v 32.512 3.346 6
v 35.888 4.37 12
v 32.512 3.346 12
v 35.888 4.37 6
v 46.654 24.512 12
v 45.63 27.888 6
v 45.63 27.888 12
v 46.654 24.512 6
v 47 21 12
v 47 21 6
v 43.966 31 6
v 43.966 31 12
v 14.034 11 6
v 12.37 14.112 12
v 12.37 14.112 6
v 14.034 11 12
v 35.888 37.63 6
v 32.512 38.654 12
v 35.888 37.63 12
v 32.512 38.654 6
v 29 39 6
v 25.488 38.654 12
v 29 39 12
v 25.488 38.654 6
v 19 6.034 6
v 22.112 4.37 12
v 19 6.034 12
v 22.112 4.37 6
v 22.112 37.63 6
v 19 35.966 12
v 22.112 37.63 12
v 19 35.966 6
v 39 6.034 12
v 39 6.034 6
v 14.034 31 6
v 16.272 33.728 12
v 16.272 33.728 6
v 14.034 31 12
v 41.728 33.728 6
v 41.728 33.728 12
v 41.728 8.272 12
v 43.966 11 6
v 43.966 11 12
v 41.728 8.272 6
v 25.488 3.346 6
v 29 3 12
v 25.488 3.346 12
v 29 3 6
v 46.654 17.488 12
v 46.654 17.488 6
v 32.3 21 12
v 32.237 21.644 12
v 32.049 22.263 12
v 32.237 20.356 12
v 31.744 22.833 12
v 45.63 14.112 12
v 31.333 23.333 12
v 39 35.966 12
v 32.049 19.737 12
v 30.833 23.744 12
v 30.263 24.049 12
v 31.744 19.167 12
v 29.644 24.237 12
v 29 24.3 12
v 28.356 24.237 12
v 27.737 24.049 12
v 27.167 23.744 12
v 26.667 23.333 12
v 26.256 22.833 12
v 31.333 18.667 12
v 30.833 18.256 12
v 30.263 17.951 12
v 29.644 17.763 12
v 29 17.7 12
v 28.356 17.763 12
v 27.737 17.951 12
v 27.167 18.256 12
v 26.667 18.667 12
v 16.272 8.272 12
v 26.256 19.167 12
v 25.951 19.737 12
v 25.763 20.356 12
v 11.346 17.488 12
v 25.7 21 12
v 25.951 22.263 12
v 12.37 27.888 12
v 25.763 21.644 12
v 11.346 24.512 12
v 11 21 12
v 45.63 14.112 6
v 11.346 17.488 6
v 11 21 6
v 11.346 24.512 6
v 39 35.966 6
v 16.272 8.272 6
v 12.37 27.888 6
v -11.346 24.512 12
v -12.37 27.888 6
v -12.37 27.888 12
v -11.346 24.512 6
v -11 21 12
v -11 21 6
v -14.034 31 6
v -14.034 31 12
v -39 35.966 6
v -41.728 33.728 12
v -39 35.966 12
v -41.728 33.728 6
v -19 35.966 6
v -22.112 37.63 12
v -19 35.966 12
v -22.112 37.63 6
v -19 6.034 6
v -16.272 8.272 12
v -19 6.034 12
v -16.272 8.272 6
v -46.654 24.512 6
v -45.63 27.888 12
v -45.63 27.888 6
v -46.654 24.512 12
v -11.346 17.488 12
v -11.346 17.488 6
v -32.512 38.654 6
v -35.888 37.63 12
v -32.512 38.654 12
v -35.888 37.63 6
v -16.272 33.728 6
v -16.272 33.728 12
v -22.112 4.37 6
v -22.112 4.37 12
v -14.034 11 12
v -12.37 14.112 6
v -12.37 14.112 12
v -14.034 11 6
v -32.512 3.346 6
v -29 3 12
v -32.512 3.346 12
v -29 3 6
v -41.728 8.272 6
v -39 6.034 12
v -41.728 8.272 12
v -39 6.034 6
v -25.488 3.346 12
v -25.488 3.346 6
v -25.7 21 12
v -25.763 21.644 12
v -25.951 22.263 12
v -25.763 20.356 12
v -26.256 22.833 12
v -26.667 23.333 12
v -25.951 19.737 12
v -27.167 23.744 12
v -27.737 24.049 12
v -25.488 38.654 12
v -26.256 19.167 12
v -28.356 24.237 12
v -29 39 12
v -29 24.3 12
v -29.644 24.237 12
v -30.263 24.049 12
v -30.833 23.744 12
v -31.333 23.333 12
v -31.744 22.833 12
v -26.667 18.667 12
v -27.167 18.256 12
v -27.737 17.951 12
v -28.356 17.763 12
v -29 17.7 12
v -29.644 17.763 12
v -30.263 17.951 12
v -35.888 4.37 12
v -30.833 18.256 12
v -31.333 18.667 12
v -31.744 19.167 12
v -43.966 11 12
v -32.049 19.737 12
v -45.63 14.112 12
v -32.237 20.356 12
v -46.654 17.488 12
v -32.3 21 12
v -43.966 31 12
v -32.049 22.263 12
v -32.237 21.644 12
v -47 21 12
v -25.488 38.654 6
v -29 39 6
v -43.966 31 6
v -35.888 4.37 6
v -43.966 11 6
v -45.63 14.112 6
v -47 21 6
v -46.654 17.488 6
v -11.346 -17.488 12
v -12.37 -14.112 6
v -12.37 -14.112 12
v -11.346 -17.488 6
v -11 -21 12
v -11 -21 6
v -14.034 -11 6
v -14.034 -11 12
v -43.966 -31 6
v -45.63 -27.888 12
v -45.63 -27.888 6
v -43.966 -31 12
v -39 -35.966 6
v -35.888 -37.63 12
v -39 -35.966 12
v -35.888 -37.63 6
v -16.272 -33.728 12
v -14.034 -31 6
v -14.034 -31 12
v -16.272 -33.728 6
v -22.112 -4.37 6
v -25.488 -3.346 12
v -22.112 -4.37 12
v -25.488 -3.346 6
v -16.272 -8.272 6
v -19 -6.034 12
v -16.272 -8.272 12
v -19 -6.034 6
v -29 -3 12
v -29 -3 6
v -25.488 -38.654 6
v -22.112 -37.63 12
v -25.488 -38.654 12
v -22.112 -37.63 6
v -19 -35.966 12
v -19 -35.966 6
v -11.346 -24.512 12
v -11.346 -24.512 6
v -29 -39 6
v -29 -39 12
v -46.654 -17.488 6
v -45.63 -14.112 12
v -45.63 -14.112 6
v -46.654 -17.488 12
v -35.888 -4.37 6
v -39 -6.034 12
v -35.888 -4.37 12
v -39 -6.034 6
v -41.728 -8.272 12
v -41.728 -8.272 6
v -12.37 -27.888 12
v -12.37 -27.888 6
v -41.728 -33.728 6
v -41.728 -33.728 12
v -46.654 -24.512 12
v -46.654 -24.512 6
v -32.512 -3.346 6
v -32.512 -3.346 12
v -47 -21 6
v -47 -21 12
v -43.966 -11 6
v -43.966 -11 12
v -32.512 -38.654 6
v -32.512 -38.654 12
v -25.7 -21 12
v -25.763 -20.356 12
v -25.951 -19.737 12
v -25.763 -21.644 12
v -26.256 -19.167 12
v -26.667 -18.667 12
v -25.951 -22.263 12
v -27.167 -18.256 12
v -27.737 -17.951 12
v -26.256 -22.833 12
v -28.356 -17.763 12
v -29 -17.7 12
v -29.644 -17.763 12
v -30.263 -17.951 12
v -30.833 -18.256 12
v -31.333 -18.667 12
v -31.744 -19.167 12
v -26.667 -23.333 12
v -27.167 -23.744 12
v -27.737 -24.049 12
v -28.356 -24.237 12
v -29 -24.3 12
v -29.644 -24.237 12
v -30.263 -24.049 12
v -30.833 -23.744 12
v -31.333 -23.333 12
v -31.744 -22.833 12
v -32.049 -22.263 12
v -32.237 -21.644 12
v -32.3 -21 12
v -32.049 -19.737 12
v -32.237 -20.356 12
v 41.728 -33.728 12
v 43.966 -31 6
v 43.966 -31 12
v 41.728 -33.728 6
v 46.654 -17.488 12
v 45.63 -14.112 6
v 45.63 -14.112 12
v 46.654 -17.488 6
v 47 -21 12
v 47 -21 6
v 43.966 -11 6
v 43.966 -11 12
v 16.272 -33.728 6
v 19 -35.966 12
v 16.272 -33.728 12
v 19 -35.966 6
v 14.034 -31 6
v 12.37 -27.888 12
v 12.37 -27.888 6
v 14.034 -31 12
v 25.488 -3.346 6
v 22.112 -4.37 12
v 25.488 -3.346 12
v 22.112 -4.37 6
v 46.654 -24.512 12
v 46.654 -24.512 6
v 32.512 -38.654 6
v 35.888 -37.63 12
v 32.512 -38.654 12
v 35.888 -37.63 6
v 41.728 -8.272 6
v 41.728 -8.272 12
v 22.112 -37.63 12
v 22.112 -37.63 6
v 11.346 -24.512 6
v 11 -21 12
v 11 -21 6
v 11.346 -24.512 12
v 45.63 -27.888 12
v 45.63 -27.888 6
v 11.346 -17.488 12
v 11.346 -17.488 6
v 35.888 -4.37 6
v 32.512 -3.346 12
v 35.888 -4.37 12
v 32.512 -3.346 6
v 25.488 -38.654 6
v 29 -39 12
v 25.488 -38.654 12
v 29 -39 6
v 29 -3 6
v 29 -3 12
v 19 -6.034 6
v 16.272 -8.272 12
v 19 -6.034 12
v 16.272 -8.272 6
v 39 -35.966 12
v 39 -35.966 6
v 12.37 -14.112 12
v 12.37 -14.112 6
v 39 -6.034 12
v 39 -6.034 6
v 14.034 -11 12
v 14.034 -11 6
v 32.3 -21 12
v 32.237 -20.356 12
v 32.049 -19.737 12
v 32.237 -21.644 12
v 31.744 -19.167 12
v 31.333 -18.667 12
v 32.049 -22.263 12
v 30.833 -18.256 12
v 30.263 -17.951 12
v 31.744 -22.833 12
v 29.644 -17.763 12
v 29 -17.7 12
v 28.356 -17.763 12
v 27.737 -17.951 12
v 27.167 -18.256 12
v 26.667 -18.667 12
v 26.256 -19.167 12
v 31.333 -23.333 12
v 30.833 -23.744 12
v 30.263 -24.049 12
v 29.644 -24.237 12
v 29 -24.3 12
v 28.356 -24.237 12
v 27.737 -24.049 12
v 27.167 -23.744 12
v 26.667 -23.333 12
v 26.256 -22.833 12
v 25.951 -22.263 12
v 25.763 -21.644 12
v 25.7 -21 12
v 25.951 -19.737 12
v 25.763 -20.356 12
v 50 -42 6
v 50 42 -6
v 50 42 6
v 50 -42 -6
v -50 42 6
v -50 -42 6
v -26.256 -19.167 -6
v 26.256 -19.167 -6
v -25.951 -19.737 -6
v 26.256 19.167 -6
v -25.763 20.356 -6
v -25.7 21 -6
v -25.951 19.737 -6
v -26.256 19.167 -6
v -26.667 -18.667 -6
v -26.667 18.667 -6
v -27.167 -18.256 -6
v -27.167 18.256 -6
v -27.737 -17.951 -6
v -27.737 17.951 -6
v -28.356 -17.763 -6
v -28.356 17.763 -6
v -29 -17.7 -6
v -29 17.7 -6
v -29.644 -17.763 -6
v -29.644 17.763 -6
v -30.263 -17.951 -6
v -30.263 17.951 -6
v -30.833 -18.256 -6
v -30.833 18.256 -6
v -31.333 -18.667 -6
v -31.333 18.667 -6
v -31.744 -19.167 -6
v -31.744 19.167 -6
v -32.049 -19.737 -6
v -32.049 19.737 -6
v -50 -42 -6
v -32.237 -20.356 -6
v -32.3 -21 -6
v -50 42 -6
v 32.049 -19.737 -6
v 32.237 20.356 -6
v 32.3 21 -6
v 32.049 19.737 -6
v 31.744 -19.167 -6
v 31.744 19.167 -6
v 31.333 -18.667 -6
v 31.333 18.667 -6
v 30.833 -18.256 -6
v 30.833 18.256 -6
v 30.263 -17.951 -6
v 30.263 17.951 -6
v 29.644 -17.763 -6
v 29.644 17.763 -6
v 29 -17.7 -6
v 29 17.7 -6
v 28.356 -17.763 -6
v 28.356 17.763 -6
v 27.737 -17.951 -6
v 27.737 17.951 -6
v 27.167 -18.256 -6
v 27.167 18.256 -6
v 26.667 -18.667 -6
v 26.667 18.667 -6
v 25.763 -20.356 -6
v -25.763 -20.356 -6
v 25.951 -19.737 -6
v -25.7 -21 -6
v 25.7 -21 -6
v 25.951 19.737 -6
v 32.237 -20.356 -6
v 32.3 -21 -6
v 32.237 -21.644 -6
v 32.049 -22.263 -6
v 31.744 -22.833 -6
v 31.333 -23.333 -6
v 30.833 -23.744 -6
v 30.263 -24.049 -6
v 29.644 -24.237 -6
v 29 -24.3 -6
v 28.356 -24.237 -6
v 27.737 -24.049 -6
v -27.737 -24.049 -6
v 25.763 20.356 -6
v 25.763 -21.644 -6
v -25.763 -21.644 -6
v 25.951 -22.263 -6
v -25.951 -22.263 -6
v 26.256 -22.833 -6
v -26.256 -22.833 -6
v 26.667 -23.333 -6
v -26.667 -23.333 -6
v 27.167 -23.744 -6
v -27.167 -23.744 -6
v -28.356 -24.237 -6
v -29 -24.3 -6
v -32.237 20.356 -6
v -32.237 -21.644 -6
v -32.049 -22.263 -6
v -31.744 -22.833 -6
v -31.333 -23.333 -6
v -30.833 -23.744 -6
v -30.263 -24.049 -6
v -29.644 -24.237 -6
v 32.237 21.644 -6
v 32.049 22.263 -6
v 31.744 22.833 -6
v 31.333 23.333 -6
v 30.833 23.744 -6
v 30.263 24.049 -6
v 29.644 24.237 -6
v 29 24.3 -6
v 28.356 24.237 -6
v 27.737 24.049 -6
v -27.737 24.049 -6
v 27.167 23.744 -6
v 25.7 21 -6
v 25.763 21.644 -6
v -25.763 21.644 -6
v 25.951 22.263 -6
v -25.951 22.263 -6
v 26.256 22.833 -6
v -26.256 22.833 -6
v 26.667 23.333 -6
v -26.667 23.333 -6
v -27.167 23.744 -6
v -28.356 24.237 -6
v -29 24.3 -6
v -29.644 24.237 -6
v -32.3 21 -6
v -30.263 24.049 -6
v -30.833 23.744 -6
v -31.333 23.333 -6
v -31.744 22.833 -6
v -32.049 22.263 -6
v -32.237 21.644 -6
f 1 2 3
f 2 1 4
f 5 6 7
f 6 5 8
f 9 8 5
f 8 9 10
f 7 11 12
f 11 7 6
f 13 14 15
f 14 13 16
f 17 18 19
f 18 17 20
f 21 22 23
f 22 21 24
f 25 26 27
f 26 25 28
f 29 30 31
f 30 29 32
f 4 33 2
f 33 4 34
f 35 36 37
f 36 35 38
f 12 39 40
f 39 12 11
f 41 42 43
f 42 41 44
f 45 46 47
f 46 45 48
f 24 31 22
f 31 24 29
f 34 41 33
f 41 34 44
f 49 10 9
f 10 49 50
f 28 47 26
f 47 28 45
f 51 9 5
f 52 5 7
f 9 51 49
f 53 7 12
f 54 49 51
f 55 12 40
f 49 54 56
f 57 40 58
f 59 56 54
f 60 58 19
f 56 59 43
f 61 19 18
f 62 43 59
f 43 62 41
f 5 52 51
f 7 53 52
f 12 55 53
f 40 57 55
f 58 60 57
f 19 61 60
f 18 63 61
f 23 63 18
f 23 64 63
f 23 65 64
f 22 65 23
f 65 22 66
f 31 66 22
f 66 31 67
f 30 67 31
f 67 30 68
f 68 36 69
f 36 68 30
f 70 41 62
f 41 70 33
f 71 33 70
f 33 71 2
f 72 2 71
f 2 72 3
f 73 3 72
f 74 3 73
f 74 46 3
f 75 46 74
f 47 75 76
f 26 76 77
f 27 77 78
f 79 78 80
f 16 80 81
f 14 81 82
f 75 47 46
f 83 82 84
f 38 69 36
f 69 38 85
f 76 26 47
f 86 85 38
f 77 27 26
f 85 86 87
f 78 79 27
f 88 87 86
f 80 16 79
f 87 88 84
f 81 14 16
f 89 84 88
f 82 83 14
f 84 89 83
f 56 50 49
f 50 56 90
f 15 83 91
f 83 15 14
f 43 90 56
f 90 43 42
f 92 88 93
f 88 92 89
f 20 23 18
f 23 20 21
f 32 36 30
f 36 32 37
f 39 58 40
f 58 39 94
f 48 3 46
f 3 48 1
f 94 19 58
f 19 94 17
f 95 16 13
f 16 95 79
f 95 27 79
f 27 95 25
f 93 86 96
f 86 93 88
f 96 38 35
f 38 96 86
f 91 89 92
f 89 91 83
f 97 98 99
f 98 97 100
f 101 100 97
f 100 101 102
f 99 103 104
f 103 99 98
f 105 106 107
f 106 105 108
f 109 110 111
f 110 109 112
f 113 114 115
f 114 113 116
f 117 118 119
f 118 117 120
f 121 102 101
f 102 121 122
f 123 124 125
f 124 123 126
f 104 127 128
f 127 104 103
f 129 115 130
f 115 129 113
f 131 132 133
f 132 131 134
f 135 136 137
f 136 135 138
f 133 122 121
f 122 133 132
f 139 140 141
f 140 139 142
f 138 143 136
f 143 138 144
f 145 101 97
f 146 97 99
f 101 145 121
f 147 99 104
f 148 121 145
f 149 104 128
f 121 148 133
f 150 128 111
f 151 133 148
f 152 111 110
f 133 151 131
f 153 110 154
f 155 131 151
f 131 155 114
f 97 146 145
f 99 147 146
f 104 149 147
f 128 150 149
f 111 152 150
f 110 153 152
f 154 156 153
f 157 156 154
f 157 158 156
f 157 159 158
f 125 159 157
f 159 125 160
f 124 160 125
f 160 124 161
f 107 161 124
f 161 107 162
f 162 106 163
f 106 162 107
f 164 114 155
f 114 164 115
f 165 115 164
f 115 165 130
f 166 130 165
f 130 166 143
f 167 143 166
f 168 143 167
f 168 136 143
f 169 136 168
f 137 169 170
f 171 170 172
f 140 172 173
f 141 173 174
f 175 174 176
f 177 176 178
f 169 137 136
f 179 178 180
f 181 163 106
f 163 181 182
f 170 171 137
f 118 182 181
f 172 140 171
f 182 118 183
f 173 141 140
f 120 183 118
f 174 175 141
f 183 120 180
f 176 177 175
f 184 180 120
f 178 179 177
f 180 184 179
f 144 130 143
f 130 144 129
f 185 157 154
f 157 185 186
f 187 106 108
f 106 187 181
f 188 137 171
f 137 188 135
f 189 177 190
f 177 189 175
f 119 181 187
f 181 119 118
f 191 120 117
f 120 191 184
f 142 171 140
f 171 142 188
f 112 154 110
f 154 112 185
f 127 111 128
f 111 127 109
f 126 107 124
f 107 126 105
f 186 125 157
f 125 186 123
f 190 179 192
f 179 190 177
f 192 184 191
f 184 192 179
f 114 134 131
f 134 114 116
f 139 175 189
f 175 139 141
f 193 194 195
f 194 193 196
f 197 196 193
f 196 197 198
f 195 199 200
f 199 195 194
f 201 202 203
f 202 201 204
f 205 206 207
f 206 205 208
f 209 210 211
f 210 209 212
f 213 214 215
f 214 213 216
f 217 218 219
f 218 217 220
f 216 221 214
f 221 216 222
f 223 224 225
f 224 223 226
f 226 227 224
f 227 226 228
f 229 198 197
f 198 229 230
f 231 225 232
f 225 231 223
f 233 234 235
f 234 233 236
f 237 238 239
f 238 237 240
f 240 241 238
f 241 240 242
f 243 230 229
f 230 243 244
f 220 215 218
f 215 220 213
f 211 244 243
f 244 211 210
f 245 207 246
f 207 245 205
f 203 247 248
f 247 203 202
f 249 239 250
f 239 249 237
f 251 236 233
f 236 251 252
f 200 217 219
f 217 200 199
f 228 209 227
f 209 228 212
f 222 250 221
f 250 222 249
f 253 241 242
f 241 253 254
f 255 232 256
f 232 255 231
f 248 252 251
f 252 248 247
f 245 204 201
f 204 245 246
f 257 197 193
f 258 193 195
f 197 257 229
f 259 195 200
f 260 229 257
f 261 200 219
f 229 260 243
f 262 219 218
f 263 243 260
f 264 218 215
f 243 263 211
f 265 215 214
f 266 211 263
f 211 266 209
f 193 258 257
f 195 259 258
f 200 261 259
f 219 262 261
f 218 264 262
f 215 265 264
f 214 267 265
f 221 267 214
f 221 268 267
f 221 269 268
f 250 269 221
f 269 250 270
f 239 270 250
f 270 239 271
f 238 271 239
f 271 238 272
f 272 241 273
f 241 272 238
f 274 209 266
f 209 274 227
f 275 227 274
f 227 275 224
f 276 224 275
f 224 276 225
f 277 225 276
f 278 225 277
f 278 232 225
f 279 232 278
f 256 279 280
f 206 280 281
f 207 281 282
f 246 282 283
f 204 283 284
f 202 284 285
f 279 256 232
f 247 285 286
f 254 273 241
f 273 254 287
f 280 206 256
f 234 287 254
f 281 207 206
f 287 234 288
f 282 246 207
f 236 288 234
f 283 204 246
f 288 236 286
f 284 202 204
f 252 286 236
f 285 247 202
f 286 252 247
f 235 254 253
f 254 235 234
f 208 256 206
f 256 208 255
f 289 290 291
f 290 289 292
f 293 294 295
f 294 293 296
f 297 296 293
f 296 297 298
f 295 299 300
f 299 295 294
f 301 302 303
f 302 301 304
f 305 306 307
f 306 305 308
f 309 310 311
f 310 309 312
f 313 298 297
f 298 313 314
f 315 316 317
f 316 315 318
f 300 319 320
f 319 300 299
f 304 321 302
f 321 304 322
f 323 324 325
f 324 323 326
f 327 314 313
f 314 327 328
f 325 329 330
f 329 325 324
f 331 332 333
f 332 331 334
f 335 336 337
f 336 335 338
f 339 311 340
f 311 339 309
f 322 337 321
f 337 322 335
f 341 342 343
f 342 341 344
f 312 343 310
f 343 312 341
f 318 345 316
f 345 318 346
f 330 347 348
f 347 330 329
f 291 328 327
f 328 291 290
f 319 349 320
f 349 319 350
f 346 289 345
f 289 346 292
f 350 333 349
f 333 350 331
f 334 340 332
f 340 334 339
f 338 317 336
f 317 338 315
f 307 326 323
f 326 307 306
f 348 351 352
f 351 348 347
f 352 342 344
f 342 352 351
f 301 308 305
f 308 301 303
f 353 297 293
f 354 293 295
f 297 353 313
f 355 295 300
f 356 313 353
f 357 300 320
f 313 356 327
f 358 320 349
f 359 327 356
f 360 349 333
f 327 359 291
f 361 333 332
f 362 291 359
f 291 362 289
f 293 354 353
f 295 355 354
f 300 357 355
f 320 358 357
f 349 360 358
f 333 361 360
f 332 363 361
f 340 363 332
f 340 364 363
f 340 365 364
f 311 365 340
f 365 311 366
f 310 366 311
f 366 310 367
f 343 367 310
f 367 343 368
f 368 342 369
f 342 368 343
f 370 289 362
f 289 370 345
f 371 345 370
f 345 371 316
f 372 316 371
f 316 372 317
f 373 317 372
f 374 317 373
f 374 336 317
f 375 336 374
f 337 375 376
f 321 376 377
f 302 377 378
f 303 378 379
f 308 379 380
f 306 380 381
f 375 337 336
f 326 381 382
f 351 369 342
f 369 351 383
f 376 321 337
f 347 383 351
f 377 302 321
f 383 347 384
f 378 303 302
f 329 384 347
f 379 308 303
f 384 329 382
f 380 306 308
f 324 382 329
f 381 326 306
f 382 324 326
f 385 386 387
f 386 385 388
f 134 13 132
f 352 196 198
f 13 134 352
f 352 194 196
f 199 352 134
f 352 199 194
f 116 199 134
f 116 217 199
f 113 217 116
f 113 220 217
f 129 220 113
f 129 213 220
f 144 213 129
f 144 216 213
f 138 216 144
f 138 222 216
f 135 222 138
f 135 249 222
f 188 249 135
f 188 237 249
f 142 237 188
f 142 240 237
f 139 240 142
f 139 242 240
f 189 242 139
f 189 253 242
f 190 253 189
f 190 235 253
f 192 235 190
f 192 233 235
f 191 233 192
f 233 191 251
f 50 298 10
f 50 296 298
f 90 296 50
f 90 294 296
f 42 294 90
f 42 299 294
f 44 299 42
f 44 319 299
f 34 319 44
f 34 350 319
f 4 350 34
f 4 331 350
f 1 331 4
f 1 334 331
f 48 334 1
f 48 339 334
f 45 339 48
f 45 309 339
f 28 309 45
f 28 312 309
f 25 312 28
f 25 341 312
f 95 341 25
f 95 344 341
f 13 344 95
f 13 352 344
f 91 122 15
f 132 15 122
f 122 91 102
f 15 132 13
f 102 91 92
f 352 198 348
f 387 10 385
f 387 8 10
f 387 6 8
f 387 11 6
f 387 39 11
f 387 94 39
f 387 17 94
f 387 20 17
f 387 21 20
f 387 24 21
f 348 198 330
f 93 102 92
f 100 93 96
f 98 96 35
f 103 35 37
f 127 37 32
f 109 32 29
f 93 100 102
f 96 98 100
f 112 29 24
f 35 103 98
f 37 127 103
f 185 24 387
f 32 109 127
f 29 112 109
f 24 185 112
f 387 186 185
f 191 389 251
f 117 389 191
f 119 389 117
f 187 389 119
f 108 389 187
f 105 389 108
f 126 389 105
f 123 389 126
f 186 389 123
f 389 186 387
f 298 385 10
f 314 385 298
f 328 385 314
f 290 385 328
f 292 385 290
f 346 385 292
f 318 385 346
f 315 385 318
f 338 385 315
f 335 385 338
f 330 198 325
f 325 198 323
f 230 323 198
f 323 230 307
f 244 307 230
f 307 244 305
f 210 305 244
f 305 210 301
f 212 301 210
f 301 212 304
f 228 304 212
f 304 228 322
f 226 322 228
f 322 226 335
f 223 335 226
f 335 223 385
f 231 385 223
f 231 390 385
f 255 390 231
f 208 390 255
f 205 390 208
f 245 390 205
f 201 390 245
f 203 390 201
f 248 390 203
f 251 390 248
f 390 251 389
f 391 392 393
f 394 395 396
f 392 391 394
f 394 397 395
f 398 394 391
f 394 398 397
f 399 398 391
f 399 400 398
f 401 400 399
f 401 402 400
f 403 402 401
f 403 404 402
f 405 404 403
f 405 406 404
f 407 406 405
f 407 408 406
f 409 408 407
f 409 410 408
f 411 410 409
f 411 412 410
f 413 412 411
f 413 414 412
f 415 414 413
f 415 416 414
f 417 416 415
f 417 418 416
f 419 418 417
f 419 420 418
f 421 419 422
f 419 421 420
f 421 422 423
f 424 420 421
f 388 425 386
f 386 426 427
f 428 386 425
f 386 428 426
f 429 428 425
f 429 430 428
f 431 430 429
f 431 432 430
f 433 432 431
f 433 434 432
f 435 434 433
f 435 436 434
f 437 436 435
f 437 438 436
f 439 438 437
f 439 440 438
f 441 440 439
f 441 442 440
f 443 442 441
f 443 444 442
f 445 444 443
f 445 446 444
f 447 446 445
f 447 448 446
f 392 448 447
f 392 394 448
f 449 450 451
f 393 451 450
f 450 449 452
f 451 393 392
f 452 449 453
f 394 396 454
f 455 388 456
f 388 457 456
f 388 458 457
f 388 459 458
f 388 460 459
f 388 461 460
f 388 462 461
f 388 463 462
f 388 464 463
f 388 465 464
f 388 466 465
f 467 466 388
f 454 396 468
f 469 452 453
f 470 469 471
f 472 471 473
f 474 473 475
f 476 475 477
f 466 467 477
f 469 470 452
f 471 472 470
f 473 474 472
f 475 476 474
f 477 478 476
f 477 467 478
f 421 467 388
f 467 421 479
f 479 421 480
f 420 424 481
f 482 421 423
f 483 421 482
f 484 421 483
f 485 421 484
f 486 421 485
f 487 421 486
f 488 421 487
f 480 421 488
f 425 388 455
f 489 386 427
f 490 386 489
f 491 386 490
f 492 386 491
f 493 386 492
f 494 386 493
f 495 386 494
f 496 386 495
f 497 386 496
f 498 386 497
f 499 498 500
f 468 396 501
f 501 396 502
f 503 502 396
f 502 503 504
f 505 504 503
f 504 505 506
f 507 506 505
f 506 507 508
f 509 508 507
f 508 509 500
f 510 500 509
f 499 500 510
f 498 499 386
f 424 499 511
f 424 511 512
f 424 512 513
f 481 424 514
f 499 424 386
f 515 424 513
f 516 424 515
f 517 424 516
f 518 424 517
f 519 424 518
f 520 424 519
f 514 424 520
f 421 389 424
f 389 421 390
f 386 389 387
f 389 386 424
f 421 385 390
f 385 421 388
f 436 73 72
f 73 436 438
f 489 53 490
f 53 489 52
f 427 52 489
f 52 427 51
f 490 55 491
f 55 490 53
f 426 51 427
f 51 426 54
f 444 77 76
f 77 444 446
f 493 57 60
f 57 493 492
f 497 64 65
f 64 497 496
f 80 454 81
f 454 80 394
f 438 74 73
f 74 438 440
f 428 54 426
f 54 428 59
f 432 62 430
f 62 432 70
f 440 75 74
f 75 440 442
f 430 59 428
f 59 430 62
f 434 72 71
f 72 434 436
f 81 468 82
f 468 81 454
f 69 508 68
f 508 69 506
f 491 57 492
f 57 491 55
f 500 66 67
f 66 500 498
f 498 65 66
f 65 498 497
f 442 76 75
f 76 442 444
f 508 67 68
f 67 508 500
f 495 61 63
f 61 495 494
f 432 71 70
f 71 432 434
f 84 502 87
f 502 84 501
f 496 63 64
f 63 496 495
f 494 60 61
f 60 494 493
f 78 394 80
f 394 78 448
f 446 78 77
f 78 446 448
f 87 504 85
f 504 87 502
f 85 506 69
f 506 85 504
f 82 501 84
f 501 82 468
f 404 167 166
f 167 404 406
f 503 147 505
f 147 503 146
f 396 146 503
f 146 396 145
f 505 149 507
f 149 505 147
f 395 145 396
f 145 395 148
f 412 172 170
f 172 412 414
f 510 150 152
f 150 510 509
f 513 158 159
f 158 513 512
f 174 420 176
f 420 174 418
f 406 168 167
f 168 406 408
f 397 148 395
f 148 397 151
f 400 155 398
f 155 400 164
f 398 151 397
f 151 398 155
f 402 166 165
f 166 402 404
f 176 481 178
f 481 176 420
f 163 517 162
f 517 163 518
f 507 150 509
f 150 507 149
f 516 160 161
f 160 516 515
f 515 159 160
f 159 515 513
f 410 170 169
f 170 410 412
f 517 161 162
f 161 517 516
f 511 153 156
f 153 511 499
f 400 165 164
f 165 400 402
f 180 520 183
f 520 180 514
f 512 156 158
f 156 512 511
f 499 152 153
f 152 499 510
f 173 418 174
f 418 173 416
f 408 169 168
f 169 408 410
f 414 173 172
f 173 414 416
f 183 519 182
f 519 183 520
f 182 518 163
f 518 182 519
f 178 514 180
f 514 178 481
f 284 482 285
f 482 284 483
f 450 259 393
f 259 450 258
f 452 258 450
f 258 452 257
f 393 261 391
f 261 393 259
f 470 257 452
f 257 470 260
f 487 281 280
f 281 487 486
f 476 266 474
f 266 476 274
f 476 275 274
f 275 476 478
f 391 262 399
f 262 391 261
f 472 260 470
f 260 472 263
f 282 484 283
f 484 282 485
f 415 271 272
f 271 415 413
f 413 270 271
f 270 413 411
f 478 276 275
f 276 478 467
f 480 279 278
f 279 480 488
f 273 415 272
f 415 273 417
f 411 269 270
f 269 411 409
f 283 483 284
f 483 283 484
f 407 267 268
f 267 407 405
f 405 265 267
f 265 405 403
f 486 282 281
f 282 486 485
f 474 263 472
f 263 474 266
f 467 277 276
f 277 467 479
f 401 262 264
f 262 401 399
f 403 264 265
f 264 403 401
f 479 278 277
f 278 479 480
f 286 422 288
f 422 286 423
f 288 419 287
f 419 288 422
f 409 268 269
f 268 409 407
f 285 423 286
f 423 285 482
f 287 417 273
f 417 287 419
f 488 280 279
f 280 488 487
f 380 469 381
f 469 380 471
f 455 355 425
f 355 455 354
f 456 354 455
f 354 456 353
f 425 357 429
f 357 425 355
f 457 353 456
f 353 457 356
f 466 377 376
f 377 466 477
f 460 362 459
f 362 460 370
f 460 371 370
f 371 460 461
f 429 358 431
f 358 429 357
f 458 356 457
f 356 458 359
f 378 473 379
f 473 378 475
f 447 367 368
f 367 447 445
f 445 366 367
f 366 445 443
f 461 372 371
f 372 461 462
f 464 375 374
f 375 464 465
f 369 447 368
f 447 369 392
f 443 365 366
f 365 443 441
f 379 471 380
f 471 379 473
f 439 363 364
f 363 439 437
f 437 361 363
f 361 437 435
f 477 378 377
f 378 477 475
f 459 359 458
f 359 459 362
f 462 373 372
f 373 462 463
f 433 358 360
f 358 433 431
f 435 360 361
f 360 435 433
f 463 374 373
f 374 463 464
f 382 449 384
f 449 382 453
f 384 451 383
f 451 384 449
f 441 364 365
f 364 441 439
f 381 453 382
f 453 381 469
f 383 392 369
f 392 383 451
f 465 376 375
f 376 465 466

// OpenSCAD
$fn = 32;

// ----------------------------------------------------------------------
// Anchor pads 100 x 84 x 18
// four corner bosses with anchor holes
// ----------------------------------------------------------------------

// --- parameters (mm) ---
plate = [100, 84, 12];  // base plate size (x, y, z)
pads = 4;               // boss count, one per corner
edge = 21;              // boss centre offset from the plate edge
boss_d = 36;            // boss diameter
boss_h = 6;             // boss height above the base plate
hole_d = 6.6;           // hole diameter

// --- derived feature positions (mm) ---
height = plate[2] + boss_h;      // = 18   overall height of the part
corner_x = plate[0] / 2 - edge;  // = 29   boss centre X
corner_y = plate[1] / 2 - edge;  // = 21   boss centre Y
feature_centers = [
  [corner_x, corner_y],
  [-corner_x, corner_y],
  [-corner_x, -corner_y],
  [corner_x, -corner_y]
];   // boss centres, anchor holes are drilled there

// base plate, four bosses standing on it, anchor holes all the way through
difference() {
  union() {
    cube(plate, center = true);
    for (centre = feature_centers)
      translate([centre[0], centre[1], plate[2] / 2 - 1])
        cylinder(d = boss_d, h = boss_h + 1);
  }
  for (centre = feature_centers)
    translate([centre[0], centre[1], -height])
      cylinder(d = hole_d, h = 2 * height + 2);  // through boss and plate
}
